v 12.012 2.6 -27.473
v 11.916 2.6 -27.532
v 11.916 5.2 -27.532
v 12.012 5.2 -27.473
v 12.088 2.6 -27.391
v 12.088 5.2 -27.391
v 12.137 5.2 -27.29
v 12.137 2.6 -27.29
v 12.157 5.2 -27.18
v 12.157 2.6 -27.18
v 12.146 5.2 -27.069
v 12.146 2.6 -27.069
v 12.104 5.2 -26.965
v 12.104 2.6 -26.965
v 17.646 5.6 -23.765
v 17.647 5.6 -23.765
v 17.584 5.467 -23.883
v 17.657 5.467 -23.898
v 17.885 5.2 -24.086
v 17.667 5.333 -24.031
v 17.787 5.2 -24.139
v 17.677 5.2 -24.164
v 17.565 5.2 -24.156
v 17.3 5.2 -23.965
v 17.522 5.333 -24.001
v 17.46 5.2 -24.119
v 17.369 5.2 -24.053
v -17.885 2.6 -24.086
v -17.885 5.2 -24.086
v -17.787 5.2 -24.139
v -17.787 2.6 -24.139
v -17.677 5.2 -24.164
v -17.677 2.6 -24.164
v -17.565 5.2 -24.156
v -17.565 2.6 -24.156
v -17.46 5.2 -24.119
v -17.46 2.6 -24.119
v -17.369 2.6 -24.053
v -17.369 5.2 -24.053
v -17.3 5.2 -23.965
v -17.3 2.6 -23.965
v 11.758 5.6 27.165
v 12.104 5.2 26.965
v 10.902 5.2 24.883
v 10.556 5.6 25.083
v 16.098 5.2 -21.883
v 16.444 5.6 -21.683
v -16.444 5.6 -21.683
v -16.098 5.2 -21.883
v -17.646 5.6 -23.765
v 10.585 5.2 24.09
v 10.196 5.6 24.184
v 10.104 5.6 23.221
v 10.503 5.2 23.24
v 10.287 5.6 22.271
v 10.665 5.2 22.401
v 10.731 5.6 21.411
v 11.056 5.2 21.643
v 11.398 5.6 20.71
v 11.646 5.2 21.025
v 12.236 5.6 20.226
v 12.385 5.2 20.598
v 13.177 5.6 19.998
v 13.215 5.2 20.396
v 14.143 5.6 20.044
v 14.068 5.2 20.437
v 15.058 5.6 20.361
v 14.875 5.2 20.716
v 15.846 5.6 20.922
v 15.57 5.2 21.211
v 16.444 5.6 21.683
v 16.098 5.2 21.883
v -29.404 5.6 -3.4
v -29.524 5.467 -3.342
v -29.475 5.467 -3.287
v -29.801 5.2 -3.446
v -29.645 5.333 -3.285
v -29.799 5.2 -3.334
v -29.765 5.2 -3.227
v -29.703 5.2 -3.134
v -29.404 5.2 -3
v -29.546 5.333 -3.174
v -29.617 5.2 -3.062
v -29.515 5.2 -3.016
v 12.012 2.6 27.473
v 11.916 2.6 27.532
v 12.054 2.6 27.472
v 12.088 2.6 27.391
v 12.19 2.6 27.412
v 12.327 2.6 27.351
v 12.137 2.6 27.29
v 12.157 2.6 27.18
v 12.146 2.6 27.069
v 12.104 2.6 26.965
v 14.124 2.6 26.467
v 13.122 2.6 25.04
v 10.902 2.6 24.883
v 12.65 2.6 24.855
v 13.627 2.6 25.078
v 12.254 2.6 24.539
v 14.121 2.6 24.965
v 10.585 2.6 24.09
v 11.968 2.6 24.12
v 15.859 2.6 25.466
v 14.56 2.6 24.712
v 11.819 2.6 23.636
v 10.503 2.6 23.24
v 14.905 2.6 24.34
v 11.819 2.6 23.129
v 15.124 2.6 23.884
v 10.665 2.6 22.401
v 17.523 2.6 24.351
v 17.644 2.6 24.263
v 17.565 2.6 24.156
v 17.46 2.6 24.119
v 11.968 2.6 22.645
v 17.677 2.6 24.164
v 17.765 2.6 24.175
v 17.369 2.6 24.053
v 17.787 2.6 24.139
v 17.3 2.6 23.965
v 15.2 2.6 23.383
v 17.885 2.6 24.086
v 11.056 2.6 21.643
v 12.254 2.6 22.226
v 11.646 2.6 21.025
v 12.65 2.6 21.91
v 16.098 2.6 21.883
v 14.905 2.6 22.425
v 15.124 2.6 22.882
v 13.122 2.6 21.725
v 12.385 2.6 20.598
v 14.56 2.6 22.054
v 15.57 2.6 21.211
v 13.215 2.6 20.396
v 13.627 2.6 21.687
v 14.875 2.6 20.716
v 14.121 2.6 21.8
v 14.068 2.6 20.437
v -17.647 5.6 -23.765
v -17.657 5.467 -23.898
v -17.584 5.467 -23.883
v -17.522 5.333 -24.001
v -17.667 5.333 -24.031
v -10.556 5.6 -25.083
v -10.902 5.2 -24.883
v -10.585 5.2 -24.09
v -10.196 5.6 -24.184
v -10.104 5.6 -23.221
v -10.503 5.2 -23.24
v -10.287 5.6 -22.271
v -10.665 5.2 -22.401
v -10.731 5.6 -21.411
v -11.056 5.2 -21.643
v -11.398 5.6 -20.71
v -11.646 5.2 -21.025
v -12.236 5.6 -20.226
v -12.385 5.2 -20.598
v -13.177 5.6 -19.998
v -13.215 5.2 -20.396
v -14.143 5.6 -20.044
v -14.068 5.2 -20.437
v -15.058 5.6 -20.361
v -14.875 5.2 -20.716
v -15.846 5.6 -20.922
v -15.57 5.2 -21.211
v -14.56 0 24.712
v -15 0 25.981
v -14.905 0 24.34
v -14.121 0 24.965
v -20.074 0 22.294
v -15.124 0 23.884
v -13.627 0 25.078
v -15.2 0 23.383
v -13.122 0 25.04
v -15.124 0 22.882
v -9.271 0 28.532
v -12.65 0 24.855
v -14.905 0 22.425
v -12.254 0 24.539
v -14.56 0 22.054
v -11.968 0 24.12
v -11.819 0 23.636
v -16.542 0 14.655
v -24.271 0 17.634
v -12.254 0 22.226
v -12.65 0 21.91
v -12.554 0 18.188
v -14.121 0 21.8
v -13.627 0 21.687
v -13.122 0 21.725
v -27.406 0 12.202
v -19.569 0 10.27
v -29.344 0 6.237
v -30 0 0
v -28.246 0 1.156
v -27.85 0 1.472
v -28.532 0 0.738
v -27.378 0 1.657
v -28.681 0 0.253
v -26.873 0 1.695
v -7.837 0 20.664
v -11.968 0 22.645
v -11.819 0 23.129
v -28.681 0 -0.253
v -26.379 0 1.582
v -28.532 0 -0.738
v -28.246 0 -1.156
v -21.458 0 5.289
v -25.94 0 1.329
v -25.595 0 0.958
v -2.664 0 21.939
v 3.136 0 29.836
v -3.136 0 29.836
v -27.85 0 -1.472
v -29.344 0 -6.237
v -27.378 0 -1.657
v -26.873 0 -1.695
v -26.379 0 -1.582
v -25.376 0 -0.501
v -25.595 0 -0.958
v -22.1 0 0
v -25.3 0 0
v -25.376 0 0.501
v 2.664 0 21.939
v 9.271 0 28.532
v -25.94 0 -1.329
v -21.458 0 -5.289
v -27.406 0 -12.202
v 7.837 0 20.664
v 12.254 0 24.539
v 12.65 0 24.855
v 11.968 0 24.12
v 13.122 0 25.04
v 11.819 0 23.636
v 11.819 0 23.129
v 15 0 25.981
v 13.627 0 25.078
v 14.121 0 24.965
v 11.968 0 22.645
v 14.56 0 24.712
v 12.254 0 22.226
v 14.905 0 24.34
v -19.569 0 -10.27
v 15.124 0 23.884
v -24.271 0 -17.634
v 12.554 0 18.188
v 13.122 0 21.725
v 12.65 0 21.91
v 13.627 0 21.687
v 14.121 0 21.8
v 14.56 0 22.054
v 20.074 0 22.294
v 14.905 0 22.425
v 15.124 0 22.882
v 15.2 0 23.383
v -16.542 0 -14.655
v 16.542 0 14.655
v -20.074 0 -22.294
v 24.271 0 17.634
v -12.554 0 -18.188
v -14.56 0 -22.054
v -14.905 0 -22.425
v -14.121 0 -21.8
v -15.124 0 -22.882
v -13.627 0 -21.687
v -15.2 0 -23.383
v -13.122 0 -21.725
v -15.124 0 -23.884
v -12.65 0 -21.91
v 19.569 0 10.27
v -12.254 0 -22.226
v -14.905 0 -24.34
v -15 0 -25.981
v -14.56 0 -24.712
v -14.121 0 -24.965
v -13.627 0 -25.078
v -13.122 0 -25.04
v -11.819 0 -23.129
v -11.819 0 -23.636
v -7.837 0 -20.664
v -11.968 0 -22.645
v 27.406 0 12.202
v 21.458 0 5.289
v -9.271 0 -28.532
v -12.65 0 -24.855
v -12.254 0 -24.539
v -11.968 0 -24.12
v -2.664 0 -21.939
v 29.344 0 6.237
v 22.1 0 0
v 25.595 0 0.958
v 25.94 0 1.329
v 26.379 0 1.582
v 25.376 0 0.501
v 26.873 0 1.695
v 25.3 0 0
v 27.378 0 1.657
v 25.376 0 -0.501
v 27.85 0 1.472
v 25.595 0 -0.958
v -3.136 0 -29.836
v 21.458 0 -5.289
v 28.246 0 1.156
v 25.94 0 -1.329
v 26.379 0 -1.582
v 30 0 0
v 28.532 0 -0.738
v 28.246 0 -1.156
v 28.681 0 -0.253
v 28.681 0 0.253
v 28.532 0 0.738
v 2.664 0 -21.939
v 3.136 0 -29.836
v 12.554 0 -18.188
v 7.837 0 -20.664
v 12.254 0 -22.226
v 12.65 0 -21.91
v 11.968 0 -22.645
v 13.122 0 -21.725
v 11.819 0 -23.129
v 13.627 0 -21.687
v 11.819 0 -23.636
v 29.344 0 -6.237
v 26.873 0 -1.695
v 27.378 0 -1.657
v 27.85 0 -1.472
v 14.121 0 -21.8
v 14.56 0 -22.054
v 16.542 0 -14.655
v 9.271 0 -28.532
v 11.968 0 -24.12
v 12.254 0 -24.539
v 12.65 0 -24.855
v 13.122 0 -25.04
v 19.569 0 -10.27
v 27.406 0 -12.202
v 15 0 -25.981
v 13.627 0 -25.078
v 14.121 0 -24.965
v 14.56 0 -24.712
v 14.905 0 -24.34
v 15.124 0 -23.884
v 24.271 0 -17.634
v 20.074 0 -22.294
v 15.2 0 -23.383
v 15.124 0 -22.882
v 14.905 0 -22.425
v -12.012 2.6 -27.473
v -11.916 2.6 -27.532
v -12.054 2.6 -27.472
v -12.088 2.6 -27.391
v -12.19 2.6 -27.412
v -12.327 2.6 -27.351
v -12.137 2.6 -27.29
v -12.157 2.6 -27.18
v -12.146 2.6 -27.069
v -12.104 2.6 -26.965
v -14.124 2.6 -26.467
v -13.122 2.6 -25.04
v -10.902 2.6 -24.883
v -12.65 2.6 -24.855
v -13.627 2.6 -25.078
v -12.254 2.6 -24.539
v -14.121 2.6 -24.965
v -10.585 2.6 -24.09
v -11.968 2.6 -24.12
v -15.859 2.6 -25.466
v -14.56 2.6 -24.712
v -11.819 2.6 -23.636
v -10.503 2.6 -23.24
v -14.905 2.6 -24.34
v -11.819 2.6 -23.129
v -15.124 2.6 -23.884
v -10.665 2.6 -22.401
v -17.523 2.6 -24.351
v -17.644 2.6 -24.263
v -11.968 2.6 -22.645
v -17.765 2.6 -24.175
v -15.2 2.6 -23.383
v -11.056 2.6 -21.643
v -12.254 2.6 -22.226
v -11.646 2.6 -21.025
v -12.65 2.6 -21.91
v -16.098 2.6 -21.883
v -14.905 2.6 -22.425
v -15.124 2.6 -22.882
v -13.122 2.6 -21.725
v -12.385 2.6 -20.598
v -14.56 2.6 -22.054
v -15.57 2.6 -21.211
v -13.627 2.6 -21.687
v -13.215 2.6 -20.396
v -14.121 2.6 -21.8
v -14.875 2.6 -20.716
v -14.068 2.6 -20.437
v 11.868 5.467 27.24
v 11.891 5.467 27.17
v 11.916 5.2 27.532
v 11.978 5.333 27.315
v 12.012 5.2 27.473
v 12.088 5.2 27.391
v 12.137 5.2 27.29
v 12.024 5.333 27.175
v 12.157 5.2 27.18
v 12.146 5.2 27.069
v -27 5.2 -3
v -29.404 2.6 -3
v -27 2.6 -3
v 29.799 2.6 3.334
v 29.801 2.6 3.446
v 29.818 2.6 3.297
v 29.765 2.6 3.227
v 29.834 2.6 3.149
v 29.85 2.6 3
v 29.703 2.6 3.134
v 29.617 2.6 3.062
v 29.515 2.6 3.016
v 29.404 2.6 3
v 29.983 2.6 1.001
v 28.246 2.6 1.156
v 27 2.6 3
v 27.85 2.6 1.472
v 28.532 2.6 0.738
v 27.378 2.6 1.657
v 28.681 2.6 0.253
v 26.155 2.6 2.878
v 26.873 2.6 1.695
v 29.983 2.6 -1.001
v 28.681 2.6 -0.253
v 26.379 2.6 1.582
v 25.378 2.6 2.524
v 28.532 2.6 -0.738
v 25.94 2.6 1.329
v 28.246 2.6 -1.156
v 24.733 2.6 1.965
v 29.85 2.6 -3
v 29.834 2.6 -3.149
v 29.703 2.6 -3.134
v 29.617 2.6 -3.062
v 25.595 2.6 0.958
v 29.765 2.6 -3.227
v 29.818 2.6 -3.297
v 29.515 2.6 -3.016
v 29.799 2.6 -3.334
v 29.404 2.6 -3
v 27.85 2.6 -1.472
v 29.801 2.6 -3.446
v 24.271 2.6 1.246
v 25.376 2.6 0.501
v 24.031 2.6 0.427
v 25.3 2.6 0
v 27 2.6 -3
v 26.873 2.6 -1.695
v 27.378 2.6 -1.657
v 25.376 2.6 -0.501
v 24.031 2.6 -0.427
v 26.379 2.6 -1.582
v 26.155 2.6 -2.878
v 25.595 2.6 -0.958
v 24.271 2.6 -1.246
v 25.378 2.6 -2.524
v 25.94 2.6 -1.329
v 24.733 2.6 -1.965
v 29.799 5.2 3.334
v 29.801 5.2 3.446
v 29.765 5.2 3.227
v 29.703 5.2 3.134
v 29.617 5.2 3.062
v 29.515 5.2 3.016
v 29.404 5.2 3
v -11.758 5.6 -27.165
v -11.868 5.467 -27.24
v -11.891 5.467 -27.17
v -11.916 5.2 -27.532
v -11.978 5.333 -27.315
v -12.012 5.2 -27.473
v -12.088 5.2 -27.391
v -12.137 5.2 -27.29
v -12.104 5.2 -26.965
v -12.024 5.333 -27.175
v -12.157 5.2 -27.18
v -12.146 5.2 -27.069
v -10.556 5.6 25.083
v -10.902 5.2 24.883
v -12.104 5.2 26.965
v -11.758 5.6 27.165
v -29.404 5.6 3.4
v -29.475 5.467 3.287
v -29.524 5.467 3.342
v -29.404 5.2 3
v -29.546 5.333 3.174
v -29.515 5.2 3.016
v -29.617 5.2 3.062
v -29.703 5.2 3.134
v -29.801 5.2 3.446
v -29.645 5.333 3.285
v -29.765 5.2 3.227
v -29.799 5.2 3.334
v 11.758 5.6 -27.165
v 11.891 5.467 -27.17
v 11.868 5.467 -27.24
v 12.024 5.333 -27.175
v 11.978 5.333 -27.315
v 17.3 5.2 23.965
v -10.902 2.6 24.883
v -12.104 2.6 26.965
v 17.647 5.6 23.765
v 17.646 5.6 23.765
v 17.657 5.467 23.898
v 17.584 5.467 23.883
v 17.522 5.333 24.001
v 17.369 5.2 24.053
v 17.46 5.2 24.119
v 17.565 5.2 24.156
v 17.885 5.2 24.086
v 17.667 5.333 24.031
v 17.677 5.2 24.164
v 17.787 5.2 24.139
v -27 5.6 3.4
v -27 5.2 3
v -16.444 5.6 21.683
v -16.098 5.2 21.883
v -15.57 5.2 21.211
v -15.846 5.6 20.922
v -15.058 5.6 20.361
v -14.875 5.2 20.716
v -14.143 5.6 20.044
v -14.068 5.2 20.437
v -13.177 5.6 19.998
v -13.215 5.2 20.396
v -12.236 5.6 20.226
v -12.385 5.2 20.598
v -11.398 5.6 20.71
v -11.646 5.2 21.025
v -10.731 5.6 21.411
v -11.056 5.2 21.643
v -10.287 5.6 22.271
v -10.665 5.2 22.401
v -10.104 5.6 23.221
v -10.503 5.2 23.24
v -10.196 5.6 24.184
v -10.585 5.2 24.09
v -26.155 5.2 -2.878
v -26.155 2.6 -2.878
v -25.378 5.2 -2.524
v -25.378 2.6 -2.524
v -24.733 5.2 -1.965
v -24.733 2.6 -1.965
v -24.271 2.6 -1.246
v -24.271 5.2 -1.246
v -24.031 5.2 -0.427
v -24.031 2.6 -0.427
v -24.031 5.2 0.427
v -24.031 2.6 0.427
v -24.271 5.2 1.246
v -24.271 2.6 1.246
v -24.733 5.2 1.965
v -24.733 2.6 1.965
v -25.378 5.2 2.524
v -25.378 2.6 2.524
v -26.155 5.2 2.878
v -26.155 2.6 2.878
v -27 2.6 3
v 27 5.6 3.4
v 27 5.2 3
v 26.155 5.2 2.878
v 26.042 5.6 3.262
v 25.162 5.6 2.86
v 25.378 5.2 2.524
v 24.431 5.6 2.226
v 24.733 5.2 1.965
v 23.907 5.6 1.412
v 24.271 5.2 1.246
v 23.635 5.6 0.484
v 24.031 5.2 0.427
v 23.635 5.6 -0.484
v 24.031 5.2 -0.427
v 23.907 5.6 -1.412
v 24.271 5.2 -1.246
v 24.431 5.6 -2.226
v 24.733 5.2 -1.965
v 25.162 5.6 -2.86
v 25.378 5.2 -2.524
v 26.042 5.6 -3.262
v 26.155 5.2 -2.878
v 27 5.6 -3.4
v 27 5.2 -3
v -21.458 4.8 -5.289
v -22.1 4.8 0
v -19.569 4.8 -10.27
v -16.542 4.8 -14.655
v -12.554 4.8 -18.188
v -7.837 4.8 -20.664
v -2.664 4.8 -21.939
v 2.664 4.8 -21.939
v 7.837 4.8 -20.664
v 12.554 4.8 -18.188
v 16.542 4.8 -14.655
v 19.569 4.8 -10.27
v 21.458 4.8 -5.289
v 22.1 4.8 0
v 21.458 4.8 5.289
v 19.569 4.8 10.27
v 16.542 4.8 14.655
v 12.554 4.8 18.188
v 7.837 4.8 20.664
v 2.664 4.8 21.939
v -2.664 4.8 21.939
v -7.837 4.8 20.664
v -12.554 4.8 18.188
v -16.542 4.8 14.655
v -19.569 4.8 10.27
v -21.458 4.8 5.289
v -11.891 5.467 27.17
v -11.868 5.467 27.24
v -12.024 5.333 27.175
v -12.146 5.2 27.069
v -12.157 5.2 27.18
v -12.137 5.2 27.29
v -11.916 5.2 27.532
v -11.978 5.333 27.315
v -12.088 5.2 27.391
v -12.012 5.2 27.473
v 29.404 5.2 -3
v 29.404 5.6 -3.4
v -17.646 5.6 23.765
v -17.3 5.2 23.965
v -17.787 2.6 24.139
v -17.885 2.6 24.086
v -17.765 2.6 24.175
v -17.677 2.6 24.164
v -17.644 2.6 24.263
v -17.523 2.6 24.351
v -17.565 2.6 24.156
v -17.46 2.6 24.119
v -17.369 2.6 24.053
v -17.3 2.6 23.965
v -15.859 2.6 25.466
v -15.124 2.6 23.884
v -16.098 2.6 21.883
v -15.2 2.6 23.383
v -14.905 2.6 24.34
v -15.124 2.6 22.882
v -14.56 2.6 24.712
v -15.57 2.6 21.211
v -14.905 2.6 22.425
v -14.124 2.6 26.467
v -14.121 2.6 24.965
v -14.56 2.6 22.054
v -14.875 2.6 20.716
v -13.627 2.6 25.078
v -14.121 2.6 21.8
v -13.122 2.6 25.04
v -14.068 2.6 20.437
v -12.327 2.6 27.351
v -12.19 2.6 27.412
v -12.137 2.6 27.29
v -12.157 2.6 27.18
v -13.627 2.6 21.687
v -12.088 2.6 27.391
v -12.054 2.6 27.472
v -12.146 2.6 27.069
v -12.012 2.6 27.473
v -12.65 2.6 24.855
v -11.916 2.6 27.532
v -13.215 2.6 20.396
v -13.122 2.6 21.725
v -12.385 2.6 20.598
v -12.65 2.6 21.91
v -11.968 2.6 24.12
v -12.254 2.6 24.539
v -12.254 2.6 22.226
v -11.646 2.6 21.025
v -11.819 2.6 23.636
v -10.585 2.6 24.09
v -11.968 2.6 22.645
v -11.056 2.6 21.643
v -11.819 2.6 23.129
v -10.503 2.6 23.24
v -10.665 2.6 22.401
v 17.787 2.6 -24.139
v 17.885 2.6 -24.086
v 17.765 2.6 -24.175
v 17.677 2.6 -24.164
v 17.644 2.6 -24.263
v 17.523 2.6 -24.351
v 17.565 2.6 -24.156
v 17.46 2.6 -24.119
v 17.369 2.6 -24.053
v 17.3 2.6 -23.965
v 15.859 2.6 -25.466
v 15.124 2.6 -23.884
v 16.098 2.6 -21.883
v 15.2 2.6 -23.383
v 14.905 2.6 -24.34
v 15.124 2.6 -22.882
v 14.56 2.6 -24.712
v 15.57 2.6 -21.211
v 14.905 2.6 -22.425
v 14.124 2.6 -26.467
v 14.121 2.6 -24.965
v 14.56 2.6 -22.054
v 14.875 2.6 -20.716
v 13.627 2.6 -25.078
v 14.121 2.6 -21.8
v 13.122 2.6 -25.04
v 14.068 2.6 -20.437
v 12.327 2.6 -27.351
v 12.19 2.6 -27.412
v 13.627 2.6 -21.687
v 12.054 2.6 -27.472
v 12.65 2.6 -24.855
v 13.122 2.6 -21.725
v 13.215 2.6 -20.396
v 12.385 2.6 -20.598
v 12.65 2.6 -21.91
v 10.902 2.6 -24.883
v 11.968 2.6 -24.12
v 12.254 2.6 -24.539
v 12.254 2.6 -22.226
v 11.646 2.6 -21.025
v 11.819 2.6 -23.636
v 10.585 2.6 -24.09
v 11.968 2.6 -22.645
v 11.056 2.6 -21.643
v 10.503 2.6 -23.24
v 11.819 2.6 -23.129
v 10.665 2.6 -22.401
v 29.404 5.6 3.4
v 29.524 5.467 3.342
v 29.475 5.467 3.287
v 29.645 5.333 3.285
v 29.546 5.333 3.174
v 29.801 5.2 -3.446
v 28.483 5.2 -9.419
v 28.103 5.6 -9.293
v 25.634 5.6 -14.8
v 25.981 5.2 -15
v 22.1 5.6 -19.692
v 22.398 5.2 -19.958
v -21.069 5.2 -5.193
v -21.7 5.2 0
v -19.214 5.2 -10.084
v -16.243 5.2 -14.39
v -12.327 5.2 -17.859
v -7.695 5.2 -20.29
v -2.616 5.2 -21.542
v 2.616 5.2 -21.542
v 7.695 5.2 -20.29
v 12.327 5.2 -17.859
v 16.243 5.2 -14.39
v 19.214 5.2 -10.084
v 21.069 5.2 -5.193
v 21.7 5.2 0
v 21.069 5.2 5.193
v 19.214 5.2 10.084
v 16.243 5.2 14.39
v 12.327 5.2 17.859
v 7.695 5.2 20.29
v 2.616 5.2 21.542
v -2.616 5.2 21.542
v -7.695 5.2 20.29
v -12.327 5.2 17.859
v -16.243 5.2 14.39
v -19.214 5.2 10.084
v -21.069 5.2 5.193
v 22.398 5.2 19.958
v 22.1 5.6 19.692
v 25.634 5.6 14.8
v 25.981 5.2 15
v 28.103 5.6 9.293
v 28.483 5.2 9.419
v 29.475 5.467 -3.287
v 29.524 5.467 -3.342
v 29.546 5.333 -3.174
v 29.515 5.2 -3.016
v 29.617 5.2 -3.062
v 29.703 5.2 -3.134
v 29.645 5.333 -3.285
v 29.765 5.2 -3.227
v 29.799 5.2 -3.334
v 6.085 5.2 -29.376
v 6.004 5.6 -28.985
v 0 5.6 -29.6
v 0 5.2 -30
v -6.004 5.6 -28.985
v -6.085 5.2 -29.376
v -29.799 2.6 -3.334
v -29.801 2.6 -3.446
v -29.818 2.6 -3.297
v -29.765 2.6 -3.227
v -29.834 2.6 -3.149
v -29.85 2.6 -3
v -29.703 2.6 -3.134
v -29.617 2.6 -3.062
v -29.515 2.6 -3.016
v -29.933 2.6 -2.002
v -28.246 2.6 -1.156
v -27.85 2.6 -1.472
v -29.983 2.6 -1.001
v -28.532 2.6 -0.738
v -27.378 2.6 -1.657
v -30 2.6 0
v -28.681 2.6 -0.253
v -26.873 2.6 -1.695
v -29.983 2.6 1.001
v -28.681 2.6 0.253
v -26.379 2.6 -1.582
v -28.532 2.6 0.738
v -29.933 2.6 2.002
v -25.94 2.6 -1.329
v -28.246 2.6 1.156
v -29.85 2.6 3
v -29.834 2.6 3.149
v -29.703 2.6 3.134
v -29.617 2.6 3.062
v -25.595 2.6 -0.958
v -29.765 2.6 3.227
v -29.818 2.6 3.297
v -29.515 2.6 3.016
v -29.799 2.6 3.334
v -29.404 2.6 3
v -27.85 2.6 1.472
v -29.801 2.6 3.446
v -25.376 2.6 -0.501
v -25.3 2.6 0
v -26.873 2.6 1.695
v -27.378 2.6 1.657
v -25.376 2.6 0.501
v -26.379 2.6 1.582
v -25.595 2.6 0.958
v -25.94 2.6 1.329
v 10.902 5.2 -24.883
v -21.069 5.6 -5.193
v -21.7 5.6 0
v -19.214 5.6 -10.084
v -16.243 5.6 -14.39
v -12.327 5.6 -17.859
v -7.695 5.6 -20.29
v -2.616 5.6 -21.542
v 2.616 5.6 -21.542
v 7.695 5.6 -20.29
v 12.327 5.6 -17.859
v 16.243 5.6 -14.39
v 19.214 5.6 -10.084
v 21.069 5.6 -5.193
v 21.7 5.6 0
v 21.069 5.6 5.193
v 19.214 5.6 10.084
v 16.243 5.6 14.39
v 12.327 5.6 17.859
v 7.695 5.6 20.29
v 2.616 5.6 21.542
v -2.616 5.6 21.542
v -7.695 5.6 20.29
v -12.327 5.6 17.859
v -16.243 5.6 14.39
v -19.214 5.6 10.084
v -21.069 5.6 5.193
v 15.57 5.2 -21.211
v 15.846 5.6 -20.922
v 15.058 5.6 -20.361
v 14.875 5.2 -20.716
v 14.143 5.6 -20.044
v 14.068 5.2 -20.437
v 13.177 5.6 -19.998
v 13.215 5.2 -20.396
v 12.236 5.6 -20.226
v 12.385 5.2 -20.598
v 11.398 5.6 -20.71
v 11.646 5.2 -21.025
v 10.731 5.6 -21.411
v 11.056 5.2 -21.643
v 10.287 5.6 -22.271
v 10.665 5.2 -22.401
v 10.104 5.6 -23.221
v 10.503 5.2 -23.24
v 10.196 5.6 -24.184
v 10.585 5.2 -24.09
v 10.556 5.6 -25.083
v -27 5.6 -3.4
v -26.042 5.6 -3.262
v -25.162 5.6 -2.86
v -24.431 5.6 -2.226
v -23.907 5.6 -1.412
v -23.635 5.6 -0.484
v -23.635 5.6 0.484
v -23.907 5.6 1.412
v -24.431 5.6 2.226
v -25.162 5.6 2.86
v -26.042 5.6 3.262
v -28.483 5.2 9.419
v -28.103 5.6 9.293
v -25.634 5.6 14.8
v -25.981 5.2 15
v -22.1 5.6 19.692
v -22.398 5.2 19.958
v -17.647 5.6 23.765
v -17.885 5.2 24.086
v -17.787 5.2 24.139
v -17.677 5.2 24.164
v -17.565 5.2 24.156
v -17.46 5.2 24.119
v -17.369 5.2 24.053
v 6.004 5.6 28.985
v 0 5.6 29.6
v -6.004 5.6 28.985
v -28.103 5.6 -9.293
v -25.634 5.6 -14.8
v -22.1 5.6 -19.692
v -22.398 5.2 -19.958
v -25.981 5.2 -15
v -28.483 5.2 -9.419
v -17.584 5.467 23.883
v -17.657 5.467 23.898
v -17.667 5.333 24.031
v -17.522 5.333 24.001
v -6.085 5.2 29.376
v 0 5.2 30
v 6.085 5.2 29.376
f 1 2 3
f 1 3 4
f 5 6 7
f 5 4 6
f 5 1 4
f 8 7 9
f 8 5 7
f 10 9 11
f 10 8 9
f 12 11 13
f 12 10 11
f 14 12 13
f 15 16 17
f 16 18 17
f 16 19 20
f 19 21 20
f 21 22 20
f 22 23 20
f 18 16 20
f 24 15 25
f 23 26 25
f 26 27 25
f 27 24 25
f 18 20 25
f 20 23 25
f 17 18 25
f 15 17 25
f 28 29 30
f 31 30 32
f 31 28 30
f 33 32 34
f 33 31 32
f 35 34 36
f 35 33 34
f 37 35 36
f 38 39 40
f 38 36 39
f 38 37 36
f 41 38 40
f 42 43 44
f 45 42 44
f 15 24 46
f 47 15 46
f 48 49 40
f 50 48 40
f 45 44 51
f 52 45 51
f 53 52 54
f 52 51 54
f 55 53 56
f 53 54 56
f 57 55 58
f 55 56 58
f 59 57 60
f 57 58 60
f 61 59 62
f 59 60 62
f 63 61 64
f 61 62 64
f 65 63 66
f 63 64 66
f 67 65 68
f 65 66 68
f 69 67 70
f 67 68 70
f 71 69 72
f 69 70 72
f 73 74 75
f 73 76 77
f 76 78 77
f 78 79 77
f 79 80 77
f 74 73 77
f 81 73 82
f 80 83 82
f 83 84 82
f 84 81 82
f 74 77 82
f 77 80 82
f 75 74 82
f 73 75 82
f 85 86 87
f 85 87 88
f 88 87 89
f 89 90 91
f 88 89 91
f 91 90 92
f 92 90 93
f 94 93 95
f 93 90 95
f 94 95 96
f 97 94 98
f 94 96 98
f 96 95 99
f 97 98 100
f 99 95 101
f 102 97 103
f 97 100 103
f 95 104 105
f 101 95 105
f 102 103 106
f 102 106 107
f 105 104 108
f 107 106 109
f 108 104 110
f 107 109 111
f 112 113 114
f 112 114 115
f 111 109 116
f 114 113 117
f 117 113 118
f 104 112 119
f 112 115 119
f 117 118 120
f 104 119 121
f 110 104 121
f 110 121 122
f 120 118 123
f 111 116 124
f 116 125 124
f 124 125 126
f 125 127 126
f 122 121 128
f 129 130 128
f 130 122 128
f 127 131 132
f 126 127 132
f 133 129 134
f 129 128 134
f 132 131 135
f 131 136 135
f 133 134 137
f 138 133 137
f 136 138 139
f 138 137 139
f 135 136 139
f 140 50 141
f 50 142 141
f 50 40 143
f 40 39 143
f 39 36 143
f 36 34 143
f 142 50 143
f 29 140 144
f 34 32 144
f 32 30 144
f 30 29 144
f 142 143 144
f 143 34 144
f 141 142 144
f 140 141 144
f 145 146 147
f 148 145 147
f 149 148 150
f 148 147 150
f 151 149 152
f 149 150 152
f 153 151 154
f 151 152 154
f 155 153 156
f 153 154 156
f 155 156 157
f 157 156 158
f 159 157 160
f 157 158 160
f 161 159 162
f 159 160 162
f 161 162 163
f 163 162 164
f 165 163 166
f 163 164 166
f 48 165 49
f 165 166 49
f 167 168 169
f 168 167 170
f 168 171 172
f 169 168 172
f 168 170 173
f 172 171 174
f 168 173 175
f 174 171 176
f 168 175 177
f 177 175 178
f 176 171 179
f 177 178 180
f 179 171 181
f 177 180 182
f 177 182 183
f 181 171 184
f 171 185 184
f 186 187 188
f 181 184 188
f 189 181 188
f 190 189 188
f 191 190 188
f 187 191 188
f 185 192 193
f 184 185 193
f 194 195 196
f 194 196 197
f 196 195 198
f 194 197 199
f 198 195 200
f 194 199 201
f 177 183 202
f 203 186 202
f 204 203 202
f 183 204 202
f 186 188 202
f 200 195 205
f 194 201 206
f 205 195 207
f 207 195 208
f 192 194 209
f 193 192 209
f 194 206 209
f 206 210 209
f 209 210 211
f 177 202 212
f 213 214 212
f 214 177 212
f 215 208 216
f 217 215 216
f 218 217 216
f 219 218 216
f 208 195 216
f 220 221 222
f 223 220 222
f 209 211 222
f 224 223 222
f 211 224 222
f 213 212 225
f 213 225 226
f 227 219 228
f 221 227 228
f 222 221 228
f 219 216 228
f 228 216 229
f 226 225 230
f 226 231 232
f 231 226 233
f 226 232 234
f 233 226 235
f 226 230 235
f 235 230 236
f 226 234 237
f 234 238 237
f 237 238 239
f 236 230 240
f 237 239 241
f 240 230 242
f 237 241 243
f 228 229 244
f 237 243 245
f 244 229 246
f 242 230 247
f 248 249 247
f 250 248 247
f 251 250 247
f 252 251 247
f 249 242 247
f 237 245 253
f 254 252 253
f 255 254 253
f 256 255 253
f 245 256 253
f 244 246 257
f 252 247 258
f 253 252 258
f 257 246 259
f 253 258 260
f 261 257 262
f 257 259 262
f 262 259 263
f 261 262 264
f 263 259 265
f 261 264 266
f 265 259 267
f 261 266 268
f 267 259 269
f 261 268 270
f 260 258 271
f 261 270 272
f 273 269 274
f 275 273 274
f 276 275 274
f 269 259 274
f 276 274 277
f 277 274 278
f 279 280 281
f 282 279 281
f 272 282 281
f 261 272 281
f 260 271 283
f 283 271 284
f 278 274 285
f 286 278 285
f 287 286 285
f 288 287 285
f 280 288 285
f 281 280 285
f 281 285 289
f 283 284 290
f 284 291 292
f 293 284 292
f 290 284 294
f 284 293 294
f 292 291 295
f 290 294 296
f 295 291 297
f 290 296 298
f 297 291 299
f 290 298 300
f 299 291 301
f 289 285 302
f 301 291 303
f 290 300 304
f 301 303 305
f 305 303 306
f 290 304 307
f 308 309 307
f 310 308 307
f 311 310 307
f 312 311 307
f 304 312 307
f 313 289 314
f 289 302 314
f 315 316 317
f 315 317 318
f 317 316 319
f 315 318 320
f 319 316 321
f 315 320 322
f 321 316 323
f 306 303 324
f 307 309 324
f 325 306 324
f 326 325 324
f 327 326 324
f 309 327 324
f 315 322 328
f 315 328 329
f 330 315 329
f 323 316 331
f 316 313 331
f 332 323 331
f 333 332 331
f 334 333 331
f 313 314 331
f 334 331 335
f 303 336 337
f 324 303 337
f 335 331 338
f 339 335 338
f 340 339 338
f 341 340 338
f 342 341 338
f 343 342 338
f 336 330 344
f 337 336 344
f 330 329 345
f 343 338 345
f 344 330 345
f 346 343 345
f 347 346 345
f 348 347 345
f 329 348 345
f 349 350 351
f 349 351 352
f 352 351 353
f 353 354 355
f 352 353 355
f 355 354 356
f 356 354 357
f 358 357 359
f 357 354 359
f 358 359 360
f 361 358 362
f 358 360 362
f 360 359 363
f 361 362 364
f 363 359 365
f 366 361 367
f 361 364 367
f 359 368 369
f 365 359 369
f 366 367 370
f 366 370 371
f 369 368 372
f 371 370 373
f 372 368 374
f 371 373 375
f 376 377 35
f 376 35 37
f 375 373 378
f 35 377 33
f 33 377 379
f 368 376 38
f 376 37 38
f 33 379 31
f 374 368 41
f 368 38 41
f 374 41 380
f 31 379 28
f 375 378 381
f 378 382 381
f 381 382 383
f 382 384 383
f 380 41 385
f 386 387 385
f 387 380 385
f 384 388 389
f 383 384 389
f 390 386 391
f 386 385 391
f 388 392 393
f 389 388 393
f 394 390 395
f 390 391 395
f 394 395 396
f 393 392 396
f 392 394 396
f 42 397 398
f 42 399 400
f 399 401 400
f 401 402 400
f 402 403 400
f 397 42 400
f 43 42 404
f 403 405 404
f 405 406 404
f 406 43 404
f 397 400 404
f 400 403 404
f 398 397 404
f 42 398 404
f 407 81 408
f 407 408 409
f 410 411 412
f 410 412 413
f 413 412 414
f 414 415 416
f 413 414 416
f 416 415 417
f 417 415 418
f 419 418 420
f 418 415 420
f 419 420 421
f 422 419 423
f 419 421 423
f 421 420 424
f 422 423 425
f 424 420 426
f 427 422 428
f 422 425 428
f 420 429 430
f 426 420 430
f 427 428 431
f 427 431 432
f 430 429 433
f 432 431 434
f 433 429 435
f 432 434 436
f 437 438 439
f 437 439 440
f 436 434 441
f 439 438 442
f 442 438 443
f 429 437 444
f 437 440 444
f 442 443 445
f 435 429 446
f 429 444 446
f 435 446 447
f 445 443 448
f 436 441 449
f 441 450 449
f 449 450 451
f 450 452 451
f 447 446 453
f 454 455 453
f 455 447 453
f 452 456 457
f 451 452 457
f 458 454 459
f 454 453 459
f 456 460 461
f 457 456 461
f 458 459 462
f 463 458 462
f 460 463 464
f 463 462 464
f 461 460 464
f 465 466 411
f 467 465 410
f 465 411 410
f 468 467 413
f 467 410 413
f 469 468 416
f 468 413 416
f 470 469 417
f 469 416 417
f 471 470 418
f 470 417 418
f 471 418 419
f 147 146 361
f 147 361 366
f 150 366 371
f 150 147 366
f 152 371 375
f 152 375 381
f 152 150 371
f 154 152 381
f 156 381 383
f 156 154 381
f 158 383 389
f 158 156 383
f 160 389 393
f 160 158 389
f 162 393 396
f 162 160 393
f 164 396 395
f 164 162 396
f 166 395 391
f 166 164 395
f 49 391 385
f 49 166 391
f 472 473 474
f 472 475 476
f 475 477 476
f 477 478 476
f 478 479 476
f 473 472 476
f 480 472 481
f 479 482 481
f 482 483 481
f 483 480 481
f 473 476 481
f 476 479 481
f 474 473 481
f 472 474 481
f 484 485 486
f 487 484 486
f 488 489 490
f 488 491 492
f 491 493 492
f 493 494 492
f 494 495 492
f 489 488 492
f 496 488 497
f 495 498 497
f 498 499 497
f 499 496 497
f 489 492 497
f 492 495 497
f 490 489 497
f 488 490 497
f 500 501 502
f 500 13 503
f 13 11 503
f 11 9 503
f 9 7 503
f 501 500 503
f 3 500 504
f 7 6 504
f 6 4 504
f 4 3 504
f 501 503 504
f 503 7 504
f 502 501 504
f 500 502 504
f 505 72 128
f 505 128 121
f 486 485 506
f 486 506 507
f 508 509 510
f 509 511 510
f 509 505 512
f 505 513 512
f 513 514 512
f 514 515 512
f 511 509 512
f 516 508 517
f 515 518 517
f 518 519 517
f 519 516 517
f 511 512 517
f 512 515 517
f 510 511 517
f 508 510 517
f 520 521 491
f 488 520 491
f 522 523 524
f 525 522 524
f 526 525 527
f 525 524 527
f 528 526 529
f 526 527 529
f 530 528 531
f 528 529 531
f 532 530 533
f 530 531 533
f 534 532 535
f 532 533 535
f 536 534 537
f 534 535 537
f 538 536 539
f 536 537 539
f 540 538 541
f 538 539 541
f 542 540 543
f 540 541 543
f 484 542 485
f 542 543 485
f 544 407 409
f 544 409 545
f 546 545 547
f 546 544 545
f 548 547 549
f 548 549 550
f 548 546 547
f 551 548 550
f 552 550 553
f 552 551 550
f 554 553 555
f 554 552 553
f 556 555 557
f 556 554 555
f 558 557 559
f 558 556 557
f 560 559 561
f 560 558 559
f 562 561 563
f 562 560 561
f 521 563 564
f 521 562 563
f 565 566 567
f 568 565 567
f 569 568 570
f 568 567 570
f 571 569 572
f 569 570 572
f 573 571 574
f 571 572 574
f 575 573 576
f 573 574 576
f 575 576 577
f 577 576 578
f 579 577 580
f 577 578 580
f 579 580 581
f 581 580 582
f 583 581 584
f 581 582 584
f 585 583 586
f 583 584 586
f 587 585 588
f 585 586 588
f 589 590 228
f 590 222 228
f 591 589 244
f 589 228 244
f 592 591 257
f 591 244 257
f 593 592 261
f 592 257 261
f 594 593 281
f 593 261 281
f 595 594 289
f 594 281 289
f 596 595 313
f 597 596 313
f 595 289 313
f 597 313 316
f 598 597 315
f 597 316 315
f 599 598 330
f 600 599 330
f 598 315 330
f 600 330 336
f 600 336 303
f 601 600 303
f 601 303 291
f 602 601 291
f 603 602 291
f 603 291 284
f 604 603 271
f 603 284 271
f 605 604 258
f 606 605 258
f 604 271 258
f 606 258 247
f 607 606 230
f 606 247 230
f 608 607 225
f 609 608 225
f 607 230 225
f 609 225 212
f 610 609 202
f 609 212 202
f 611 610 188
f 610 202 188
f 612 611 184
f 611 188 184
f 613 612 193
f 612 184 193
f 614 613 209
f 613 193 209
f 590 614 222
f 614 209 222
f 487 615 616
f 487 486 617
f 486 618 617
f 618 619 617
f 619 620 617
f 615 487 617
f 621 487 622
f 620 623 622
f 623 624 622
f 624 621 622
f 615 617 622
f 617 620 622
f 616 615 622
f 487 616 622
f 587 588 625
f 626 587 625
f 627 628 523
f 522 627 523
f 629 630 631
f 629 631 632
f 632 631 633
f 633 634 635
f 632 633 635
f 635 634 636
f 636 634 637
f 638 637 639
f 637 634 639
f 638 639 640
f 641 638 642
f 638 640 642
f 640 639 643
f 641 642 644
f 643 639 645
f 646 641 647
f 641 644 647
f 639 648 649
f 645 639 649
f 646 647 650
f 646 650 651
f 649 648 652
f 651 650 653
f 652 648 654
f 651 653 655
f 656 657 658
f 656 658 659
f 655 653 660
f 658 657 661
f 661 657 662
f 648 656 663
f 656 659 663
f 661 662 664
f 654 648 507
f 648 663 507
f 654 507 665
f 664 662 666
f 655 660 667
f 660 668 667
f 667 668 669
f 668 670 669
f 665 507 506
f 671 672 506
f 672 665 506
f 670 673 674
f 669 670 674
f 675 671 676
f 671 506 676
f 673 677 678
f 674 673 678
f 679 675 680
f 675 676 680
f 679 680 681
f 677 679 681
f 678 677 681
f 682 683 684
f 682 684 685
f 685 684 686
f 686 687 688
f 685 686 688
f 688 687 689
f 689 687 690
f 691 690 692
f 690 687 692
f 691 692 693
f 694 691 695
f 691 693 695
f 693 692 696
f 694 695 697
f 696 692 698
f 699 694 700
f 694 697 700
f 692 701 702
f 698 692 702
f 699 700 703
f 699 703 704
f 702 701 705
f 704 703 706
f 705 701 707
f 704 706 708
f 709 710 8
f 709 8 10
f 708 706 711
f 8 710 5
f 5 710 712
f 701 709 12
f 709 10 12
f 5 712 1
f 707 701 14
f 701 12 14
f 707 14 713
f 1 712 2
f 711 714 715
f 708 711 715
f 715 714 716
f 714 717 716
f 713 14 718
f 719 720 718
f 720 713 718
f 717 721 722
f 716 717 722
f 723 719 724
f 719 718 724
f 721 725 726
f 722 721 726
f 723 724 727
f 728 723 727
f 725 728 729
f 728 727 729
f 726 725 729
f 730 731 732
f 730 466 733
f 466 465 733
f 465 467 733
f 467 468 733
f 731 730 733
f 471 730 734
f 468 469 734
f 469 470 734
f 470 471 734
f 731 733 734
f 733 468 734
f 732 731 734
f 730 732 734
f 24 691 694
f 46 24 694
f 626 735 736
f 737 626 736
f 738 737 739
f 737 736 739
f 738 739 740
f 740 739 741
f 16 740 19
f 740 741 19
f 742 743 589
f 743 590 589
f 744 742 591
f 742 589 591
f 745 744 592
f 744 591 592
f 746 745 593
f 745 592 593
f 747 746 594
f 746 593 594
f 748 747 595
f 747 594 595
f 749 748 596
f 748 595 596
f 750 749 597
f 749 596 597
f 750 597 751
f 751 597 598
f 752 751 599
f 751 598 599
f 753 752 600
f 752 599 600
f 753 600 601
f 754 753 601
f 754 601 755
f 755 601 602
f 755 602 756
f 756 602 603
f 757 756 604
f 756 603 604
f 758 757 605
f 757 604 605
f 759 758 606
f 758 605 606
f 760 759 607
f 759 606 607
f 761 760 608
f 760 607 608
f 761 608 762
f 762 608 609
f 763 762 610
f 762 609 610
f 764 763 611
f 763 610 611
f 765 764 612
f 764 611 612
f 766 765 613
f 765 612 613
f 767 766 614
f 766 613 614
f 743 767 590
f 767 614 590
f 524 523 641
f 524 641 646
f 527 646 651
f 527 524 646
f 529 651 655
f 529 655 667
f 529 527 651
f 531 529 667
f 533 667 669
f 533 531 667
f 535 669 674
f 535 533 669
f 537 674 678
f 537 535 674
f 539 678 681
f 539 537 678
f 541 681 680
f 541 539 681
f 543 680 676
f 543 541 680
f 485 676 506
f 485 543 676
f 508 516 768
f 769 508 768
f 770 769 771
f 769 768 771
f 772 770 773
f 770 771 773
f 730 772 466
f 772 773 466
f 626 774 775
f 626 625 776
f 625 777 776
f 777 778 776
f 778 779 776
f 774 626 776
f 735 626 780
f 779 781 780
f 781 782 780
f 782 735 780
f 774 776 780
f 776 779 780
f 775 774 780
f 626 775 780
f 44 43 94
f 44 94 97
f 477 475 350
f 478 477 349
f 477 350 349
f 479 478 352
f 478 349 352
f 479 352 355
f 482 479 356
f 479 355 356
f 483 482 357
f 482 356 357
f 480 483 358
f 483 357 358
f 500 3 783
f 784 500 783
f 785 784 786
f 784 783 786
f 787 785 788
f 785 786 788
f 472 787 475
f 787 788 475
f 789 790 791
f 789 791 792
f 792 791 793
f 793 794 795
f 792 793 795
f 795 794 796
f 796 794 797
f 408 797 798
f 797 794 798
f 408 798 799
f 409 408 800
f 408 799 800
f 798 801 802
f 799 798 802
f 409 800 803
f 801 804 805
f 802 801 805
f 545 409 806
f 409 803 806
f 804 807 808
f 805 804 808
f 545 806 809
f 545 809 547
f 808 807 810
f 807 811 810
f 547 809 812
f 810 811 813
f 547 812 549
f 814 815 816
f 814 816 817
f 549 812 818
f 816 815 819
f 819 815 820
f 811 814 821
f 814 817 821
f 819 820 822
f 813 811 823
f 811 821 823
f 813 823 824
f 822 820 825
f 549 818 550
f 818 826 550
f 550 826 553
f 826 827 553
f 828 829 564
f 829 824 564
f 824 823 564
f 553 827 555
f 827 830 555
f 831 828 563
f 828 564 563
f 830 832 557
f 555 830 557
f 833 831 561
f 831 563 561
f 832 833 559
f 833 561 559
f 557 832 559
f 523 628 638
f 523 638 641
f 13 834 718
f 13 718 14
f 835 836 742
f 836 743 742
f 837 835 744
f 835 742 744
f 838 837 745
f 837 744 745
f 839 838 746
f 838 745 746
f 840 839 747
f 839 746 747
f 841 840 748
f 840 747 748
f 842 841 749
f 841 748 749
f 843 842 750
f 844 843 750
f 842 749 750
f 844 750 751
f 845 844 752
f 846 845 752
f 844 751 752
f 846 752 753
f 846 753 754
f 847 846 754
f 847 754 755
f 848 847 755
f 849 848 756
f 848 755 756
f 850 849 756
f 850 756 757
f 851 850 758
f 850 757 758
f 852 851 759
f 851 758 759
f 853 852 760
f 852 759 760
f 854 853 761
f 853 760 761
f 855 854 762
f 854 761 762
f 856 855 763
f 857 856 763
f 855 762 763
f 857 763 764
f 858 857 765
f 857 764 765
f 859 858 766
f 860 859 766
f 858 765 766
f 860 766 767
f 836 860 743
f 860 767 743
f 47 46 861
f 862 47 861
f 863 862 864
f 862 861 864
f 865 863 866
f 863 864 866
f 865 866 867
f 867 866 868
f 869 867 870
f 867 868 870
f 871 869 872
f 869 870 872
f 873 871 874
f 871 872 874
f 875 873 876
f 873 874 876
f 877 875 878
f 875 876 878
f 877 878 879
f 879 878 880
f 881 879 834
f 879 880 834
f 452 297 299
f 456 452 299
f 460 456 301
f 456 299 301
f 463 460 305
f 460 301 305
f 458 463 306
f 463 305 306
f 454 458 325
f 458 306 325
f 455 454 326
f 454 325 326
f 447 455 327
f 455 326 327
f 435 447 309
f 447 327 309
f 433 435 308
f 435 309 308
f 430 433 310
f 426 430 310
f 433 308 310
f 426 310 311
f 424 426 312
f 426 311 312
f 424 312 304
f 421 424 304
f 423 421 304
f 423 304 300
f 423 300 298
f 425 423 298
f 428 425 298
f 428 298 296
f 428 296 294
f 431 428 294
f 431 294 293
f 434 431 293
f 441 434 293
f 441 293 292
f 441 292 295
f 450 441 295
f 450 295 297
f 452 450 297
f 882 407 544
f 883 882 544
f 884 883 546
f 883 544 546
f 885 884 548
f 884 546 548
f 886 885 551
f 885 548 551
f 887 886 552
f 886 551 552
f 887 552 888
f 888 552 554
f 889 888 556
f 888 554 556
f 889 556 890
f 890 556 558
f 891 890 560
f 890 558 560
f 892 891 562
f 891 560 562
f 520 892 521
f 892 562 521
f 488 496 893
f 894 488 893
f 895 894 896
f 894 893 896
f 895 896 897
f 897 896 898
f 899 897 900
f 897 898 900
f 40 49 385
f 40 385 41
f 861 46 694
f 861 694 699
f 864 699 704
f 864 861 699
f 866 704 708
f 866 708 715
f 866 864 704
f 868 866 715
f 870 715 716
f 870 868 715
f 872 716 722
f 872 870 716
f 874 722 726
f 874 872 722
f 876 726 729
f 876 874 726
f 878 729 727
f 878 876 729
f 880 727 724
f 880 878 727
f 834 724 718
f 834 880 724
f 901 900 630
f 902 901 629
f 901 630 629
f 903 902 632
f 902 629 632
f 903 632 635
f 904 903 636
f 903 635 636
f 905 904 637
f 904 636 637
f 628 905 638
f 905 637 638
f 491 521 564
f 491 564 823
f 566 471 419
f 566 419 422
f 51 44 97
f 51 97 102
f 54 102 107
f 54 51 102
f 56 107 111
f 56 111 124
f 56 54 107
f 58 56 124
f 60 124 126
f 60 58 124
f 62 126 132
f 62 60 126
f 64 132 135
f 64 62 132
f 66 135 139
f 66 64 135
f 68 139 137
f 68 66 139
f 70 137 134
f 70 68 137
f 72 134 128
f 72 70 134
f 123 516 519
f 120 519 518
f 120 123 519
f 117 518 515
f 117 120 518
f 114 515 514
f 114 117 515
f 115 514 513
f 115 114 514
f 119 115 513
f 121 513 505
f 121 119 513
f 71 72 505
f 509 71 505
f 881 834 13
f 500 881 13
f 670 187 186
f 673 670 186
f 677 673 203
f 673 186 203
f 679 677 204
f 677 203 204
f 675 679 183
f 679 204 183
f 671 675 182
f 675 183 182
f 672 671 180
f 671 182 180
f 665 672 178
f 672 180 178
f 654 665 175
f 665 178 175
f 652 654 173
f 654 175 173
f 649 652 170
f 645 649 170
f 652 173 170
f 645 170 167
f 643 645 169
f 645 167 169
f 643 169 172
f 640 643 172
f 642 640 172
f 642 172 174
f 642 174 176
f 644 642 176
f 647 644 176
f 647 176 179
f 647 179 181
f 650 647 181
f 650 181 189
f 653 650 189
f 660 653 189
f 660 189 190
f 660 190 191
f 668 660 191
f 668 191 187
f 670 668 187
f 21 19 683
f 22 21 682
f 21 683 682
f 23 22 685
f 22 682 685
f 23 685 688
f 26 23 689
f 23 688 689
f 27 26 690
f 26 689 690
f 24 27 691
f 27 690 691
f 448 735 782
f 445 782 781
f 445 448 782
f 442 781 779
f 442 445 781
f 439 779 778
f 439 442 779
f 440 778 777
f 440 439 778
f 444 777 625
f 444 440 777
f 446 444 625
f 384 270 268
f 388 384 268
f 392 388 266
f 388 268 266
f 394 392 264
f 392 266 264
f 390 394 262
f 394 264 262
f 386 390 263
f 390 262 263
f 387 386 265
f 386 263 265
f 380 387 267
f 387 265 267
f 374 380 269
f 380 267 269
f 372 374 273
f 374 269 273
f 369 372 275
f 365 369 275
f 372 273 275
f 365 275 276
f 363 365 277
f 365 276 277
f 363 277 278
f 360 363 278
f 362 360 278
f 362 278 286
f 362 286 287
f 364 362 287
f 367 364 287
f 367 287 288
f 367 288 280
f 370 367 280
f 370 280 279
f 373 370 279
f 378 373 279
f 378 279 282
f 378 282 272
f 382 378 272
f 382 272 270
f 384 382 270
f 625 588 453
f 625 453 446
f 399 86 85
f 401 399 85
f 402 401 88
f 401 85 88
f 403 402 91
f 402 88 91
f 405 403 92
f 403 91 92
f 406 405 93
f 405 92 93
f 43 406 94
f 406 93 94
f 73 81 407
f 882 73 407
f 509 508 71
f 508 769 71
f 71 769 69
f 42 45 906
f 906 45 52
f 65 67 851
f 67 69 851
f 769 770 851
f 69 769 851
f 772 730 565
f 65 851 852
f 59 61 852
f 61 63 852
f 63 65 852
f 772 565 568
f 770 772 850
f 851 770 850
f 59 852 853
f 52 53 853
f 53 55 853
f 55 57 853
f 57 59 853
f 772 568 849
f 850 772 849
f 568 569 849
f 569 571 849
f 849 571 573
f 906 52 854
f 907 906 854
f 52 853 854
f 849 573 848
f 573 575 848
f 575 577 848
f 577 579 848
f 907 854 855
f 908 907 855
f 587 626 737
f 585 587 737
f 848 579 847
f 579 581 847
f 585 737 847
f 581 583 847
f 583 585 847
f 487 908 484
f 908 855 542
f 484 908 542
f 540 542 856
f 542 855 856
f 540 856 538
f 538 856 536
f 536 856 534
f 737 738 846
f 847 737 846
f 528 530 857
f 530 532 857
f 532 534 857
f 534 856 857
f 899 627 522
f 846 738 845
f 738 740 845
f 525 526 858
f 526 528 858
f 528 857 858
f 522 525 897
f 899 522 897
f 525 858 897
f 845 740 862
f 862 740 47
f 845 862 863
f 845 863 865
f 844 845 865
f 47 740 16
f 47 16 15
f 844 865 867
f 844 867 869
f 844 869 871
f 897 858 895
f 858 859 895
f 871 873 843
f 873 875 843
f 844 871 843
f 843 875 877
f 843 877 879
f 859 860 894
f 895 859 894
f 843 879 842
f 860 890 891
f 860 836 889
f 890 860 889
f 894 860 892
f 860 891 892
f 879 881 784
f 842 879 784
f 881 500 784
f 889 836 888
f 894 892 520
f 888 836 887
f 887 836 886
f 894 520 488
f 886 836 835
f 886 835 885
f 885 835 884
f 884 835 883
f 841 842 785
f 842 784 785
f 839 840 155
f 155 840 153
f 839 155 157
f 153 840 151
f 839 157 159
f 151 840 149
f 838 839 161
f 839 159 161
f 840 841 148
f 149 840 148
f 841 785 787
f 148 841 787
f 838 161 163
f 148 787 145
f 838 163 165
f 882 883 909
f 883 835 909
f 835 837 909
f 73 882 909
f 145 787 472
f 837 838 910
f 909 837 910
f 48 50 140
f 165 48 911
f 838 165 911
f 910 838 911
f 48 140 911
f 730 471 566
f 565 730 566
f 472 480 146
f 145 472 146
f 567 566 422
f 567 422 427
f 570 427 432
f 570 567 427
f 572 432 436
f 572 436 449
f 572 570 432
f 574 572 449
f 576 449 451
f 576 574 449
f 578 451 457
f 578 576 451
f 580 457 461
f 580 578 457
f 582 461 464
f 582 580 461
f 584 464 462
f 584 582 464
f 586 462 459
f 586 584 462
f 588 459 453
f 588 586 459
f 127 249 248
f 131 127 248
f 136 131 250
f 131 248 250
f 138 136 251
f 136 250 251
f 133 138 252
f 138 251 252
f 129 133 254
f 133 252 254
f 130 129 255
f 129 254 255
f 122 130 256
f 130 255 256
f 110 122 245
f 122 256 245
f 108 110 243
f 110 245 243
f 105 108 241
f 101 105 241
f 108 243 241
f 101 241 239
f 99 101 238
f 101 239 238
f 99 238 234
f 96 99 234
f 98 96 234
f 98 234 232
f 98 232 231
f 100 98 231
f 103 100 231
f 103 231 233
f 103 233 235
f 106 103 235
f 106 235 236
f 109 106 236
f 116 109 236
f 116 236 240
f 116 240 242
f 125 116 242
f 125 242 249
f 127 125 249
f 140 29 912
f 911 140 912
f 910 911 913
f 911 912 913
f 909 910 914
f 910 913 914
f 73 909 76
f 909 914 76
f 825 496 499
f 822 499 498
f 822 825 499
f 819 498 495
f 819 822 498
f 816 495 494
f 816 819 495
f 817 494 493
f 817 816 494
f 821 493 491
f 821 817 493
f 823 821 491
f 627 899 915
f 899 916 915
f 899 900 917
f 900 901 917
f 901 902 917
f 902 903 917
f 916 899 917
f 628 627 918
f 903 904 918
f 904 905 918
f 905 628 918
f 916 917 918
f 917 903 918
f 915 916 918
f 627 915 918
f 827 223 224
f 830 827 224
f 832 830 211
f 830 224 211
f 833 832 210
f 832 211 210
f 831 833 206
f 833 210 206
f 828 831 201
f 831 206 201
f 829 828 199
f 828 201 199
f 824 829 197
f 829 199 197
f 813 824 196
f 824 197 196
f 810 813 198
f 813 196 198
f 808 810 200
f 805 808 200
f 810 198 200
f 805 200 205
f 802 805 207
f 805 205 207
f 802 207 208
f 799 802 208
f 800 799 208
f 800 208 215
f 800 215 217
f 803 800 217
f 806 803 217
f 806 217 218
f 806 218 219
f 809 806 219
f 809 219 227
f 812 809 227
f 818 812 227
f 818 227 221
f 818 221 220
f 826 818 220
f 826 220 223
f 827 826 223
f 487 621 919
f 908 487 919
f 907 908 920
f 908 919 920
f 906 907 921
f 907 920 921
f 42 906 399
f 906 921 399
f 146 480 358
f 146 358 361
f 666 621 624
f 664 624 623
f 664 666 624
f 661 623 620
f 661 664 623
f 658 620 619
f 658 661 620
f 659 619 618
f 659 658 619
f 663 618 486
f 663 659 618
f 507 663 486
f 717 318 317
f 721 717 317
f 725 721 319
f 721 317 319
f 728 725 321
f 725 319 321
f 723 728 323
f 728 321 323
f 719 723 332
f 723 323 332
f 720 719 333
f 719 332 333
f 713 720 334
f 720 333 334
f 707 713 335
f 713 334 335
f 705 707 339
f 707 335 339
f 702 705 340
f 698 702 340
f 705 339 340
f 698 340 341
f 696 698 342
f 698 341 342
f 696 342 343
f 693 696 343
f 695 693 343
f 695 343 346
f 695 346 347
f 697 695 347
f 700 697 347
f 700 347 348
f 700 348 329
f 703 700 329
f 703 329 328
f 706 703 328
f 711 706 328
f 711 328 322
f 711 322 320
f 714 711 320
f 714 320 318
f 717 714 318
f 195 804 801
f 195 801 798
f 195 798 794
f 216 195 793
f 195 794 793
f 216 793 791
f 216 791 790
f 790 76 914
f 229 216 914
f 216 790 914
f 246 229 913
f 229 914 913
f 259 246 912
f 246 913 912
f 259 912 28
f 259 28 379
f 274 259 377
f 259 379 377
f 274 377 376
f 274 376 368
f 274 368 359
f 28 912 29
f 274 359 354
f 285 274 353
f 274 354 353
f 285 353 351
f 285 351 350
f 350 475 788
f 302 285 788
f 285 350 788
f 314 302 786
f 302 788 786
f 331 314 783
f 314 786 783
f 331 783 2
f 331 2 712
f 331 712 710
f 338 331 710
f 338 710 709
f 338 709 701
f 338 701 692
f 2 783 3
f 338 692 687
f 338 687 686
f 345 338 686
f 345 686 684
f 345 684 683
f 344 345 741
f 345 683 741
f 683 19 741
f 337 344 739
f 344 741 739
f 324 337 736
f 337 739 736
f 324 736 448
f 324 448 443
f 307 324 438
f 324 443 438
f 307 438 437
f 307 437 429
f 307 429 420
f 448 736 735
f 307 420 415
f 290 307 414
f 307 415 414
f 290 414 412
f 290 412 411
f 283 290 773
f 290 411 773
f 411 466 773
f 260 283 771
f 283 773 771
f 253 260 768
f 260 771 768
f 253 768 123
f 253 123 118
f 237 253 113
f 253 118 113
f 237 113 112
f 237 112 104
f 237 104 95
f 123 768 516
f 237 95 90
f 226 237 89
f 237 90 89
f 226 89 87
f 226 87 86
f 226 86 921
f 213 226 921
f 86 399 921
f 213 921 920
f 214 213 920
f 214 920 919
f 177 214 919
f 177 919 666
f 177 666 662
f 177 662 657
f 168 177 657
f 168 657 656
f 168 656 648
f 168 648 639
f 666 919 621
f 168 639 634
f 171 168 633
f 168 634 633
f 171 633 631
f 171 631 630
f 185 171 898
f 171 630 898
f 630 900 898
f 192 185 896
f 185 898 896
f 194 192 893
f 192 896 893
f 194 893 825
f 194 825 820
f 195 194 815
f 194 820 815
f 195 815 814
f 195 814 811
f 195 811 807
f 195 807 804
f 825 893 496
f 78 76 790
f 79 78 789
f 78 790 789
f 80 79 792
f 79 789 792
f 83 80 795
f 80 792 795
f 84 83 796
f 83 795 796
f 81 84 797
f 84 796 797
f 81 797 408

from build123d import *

# Parameters (mm, degrees)
M3_CLEARANCE_HOLE1_D = 3.4
CUT_EXTRUDE1_DEPTH   = 3
CIRPATTERN1_COUNT    = 6
FILLET2_R            = 0.4
CHAMFER1_SIZE        = 0.4


with BuildPart() as part:
    # Sketch5 → Revolve1 (revolve)
    with BuildSketch(Plane.XY, mode=Mode.PRIVATE) as revolve1_sk:
        Polygon((22.1, 0), (30, 0), (30, 5.6), (21.7, 5.6), (21.7, 5.2), (22.1, 4.8), align=None)
    revolve(revolve1_sk.sketch.rotate(Axis((0, 14.134935251, 0), (0, -1, 0)), 180), axis=Axis((0, 14.134935251, 0), (0, -1, 0)))

    # M3 Clearance Hole1 (through all)
    with Locations(Plane(origin=(0, 5.6, 0), x_dir=(1, 0, 0), z_dir=(0, 1, 0))):
        with Locations((27, 0)):
            m3_clearance_hole1 = Hole(M3_CLEARANCE_HOLE1_D / 2)

    # Sketch4 → Cut-Extrude1 (cut)
    with BuildSketch(Plane(origin=(0, 5.6, 0), x_dir=(1, 0, 0), z_dir=(0, 1, 0))):
        with BuildLine():
            Line((27, 3), (29.849623113, 3))
            ThreePointArc((29.849623113, 3), (30, 0), (29.849623113, -3))
            Line((29.849623113, -3), (27, -3))
            ThreePointArc((27, -3), (24, 0), (27, 3))
        make_face()
    cut_extrude1 = extrude(amount=-CUT_EXTRUDE1_DEPTH, mode=Mode.SUBTRACT)

    # CirPattern1: M3 Clearance Hole1, Cut-Extrude1 ×6 about axis
    cirpattern1_axis = Axis((0, 0, 0), (0, 1, 0))
    add([m3_clearance_hole1.rotate(cirpattern1_axis, i * 360 / CIRPATTERN1_COUNT) for i in range(1, CIRPATTERN1_COUNT)], mode=Mode.SUBTRACT)
    add([cut_extrude1.rotate(cirpattern1_axis, i * 360 / CIRPATTERN1_COUNT) for i in range(1, CIRPATTERN1_COUNT)], mode=Mode.SUBTRACT)

    # Fillet2
    fillet2_edges = [part.edges().sort_by_distance(p)[0] for p in [
        (-29.849623113, 4.1, 3),
        (-29.849623113, 4.1, -3),
        (-17.522887768, 4.1, -24.350531909),
        (-12.326735345, 4.1, -27.350531909),
        (12.326735345, 4.1, -27.350531909),
        (17.522887768, 4.1, -24.350531909),
        (29.849623113, 4.1, -3),
        (29.849623113, 4.1, 3),
        (17.522887768, 4.1, 24.350531909),
        (12.326735345, 4.1, 27.350531909),
        (-12.326735345, 4.1, 27.350531909),
        (-17.522887768, 4.1, 24.350531909),
    ]]
    fillet(fillet2_edges, radius=FILLET2_R)

    # Chamfer1
    chamfer1_edges = [part.edges().sort_by_distance(p)[0] for p in [
        (-24, 5.6, 0),
        (-28.202040675, 5.6, -3),
        (-12, 5.6, -20.784609691),
        (-11.502944126, 5.6, -25.923683663),
        (12, 5.6, -20.784609691),
        (16.699096549, 5.6, -22.923683663),
        (-11.502944126, 5.6, 25.923683663),
        (16.699096549, 5.6, 22.923683663),
        (25.980762114, 5.6, 15),
        (28.202040675, 5.6, -3),
        (25.980762114, 5.6, -15),
        (11.502944126, 5.6, -25.923683663),
        (0, 5.6, -30),
        (-16.699096549, 5.6, -22.923683663),
        (-25.980762114, 5.6, -15),
        (-28.202040675, 5.6, 3),
        (-25.980762114, 5.6, 15),
        (0, 5.6, 30),
        (17.565397878, 5.6, 24.156367596),
        (12.137329062, 5.6, 27.290264588),
        (29.702726941, 5.6, 3.133896992),
        (29.702726941, 5.6, -3.133896992),
        (17.565397878, 5.6, -24.156367596),
        (12.137329062, 5.6, -27.290264588),
        (-12.137329062, 5.6, -27.290264588),
        (-17.565397878, 5.6, -24.156367596),
        (-29.702726941, 5.6, -3.133896992),
        (-29.702726941, 5.6, 3.133896992),
        (-17.565397878, 5.6, 24.156367596),
        (-12.137329062, 5.6, 27.290264588),
        (24, 5.6, 0),
        (28.202040675, 5.6, 3),
        (12, 5.6, 20.784609691),
        (11.502944126, 5.6, 25.923683663),
        (-12, 5.6, 20.784609691),
        (-16.699096549, 5.6, 22.923683663),
    ]]
    chamfer(chamfer1_edges, length=CHAMFER1_SIZE - 0.0001)  # a hair under: the kernel refuses the full size


solid = part.part
